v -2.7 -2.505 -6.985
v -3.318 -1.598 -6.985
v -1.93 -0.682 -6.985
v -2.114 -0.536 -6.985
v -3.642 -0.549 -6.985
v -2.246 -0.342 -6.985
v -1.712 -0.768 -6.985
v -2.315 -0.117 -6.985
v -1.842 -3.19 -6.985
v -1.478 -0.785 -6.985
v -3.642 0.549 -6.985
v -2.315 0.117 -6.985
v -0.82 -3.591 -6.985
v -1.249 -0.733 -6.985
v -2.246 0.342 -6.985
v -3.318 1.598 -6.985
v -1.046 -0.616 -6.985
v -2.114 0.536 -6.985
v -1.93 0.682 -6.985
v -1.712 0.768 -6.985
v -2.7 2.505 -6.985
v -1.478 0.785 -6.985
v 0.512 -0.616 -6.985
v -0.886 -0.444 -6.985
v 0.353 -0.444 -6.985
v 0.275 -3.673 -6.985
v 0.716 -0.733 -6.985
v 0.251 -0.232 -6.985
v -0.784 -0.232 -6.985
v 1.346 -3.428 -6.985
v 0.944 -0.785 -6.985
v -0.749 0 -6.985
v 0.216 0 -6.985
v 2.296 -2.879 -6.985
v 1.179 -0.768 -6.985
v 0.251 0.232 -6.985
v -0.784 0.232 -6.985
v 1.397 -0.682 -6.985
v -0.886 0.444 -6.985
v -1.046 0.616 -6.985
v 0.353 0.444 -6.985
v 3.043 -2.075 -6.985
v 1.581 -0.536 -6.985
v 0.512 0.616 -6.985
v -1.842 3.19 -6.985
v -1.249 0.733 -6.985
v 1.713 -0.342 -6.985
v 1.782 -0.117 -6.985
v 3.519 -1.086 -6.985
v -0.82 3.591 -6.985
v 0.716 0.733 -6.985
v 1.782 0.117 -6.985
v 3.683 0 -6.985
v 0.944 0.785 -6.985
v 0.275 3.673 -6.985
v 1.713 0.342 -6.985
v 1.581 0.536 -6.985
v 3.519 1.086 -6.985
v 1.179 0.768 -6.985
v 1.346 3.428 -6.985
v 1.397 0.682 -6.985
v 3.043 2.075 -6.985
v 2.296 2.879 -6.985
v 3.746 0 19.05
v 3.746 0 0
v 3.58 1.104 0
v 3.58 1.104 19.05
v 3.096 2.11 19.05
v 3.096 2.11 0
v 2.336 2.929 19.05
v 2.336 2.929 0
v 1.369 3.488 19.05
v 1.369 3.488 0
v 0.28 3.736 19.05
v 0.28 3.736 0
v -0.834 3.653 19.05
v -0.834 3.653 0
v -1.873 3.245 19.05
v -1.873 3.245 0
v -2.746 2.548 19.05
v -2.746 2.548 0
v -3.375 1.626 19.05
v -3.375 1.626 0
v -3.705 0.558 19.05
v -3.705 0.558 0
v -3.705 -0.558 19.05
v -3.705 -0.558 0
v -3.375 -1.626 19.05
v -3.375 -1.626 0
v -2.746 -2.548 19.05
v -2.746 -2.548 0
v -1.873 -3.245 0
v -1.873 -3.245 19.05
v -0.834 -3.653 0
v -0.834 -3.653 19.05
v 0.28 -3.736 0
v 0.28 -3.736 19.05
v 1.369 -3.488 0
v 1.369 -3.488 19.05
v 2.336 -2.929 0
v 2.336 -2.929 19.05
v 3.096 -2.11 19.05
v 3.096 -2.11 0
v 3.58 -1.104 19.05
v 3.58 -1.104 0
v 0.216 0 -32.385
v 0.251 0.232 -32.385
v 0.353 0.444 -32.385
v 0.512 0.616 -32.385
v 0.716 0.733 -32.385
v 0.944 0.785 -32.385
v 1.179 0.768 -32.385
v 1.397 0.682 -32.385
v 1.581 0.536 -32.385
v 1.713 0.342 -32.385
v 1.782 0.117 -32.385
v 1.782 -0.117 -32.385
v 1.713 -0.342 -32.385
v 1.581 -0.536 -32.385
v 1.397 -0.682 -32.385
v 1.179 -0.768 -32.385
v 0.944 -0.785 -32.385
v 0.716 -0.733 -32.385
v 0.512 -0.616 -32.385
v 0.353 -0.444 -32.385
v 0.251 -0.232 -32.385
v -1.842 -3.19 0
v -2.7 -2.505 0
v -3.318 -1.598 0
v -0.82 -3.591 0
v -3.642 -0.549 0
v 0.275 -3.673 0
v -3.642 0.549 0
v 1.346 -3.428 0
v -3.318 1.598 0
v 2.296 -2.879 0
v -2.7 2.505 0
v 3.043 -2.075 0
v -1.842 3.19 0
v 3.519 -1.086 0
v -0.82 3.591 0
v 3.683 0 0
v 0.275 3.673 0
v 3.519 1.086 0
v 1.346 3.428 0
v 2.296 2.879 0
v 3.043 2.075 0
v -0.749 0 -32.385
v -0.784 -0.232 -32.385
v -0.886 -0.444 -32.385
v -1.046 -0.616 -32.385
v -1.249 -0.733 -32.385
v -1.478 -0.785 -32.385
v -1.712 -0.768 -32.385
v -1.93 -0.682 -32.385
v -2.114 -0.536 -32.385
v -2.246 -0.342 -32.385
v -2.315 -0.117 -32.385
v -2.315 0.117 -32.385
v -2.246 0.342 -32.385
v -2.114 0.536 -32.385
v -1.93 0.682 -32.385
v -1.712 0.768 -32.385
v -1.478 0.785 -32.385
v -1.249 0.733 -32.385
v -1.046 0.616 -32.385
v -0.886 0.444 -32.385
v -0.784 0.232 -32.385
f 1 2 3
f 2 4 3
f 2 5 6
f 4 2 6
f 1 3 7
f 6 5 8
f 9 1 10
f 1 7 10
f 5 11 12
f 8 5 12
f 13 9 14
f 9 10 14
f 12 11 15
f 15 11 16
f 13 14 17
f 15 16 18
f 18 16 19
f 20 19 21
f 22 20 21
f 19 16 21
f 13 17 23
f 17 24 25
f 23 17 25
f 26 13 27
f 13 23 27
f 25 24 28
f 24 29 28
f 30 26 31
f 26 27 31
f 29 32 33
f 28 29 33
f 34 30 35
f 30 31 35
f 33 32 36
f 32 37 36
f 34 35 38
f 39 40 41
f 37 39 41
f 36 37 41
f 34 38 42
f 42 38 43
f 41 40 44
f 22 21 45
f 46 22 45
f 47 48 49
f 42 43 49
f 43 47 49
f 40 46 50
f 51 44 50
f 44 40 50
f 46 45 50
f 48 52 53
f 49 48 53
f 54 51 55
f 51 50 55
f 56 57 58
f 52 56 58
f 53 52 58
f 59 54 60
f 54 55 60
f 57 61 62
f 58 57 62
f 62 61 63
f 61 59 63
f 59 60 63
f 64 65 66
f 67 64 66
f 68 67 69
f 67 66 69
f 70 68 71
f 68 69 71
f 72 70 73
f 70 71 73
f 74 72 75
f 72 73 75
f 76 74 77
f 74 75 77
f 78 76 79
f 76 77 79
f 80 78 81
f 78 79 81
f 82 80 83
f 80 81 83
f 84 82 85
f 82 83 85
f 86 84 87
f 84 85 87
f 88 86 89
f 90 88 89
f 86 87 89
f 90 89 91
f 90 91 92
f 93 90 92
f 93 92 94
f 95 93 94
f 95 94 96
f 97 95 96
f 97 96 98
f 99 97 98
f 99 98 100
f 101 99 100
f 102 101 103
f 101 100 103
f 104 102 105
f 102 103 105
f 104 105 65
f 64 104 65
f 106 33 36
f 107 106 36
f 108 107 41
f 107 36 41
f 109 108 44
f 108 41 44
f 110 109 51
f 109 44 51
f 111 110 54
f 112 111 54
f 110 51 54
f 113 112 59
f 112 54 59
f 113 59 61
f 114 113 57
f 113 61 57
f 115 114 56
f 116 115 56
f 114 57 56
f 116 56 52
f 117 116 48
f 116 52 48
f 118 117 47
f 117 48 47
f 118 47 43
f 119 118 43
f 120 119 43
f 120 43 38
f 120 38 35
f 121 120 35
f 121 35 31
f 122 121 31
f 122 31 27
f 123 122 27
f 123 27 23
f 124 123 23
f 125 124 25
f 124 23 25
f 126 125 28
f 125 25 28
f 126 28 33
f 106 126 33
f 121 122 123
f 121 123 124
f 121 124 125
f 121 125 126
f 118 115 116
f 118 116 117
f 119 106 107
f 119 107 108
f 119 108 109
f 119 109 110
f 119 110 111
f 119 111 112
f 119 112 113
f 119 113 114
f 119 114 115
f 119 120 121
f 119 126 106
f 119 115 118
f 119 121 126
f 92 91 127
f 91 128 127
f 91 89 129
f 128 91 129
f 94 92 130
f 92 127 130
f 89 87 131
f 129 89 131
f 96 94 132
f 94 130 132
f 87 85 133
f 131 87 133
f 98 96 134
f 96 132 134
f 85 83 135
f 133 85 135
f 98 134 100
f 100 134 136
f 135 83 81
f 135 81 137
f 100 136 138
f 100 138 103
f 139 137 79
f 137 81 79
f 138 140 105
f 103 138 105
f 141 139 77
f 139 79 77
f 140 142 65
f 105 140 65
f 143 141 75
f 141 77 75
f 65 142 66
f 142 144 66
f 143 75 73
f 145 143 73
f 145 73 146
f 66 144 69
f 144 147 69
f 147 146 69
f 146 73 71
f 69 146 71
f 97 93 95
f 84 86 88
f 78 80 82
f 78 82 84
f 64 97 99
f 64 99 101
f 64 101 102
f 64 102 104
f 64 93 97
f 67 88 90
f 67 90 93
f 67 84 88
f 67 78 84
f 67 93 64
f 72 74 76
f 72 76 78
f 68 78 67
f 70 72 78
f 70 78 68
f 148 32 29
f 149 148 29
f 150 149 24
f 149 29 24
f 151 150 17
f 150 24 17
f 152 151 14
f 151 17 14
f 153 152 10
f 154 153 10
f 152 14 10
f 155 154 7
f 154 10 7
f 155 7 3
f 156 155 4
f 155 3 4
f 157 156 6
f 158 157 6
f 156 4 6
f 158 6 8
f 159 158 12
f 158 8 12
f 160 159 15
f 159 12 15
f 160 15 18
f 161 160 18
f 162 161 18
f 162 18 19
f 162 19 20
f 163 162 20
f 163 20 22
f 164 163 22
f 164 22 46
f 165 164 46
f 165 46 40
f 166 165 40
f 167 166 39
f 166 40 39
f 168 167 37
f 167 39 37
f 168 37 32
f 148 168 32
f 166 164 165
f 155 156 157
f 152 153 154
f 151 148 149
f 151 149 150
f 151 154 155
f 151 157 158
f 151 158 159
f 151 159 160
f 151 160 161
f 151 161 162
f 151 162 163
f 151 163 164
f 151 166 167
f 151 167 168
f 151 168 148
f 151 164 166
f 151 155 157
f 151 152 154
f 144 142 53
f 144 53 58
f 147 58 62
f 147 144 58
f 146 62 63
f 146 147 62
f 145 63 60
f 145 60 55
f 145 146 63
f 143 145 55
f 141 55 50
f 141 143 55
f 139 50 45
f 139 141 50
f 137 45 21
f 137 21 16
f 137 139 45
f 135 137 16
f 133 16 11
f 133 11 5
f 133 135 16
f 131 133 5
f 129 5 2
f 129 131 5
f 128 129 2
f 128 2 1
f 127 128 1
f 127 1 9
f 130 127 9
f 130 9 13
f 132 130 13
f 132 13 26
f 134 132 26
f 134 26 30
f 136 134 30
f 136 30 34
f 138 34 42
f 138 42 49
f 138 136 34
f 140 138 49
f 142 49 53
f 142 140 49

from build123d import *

# Parameters (mm, degrees)
F0_R     = 3.683
F1_DEPTH = 6.985
F2_R     = 0.7874
F3_DEPTH = 25.4
F4_R     = 3.7465
F5_DEPTH = 19.05


with BuildPart() as f1:
    # F0 (on Top) → F1 (new body)
    with BuildSketch(Plane.XY):
        Circle(F0_R)
    extrude(amount=-F1_DEPTH)

    # F2 (on face) → F3 (join)
    with BuildSketch(Plane(origin=(0, 0, -6.985), x_dir=(1, 0, 0), z_dir=(0, 0, -1))):
        with BuildLine():
            ThreePointArc((1.7907, 0), (1.0033, 0.7874), (0.2159, 0))
            ThreePointArc((0.2159, 0), (1.0033, -0.7874), (1.7907, 0))
        make_face()
        with Locations((-1.5367, 0)):
            Circle(F2_R)
    extrude(amount=F3_DEPTH)

    # F4 (on face) → F5 (join)
    with BuildSketch(Plane.XY):
        Circle(F4_R)
    extrude(amount=F5_DEPTH)


solid = f1.part
